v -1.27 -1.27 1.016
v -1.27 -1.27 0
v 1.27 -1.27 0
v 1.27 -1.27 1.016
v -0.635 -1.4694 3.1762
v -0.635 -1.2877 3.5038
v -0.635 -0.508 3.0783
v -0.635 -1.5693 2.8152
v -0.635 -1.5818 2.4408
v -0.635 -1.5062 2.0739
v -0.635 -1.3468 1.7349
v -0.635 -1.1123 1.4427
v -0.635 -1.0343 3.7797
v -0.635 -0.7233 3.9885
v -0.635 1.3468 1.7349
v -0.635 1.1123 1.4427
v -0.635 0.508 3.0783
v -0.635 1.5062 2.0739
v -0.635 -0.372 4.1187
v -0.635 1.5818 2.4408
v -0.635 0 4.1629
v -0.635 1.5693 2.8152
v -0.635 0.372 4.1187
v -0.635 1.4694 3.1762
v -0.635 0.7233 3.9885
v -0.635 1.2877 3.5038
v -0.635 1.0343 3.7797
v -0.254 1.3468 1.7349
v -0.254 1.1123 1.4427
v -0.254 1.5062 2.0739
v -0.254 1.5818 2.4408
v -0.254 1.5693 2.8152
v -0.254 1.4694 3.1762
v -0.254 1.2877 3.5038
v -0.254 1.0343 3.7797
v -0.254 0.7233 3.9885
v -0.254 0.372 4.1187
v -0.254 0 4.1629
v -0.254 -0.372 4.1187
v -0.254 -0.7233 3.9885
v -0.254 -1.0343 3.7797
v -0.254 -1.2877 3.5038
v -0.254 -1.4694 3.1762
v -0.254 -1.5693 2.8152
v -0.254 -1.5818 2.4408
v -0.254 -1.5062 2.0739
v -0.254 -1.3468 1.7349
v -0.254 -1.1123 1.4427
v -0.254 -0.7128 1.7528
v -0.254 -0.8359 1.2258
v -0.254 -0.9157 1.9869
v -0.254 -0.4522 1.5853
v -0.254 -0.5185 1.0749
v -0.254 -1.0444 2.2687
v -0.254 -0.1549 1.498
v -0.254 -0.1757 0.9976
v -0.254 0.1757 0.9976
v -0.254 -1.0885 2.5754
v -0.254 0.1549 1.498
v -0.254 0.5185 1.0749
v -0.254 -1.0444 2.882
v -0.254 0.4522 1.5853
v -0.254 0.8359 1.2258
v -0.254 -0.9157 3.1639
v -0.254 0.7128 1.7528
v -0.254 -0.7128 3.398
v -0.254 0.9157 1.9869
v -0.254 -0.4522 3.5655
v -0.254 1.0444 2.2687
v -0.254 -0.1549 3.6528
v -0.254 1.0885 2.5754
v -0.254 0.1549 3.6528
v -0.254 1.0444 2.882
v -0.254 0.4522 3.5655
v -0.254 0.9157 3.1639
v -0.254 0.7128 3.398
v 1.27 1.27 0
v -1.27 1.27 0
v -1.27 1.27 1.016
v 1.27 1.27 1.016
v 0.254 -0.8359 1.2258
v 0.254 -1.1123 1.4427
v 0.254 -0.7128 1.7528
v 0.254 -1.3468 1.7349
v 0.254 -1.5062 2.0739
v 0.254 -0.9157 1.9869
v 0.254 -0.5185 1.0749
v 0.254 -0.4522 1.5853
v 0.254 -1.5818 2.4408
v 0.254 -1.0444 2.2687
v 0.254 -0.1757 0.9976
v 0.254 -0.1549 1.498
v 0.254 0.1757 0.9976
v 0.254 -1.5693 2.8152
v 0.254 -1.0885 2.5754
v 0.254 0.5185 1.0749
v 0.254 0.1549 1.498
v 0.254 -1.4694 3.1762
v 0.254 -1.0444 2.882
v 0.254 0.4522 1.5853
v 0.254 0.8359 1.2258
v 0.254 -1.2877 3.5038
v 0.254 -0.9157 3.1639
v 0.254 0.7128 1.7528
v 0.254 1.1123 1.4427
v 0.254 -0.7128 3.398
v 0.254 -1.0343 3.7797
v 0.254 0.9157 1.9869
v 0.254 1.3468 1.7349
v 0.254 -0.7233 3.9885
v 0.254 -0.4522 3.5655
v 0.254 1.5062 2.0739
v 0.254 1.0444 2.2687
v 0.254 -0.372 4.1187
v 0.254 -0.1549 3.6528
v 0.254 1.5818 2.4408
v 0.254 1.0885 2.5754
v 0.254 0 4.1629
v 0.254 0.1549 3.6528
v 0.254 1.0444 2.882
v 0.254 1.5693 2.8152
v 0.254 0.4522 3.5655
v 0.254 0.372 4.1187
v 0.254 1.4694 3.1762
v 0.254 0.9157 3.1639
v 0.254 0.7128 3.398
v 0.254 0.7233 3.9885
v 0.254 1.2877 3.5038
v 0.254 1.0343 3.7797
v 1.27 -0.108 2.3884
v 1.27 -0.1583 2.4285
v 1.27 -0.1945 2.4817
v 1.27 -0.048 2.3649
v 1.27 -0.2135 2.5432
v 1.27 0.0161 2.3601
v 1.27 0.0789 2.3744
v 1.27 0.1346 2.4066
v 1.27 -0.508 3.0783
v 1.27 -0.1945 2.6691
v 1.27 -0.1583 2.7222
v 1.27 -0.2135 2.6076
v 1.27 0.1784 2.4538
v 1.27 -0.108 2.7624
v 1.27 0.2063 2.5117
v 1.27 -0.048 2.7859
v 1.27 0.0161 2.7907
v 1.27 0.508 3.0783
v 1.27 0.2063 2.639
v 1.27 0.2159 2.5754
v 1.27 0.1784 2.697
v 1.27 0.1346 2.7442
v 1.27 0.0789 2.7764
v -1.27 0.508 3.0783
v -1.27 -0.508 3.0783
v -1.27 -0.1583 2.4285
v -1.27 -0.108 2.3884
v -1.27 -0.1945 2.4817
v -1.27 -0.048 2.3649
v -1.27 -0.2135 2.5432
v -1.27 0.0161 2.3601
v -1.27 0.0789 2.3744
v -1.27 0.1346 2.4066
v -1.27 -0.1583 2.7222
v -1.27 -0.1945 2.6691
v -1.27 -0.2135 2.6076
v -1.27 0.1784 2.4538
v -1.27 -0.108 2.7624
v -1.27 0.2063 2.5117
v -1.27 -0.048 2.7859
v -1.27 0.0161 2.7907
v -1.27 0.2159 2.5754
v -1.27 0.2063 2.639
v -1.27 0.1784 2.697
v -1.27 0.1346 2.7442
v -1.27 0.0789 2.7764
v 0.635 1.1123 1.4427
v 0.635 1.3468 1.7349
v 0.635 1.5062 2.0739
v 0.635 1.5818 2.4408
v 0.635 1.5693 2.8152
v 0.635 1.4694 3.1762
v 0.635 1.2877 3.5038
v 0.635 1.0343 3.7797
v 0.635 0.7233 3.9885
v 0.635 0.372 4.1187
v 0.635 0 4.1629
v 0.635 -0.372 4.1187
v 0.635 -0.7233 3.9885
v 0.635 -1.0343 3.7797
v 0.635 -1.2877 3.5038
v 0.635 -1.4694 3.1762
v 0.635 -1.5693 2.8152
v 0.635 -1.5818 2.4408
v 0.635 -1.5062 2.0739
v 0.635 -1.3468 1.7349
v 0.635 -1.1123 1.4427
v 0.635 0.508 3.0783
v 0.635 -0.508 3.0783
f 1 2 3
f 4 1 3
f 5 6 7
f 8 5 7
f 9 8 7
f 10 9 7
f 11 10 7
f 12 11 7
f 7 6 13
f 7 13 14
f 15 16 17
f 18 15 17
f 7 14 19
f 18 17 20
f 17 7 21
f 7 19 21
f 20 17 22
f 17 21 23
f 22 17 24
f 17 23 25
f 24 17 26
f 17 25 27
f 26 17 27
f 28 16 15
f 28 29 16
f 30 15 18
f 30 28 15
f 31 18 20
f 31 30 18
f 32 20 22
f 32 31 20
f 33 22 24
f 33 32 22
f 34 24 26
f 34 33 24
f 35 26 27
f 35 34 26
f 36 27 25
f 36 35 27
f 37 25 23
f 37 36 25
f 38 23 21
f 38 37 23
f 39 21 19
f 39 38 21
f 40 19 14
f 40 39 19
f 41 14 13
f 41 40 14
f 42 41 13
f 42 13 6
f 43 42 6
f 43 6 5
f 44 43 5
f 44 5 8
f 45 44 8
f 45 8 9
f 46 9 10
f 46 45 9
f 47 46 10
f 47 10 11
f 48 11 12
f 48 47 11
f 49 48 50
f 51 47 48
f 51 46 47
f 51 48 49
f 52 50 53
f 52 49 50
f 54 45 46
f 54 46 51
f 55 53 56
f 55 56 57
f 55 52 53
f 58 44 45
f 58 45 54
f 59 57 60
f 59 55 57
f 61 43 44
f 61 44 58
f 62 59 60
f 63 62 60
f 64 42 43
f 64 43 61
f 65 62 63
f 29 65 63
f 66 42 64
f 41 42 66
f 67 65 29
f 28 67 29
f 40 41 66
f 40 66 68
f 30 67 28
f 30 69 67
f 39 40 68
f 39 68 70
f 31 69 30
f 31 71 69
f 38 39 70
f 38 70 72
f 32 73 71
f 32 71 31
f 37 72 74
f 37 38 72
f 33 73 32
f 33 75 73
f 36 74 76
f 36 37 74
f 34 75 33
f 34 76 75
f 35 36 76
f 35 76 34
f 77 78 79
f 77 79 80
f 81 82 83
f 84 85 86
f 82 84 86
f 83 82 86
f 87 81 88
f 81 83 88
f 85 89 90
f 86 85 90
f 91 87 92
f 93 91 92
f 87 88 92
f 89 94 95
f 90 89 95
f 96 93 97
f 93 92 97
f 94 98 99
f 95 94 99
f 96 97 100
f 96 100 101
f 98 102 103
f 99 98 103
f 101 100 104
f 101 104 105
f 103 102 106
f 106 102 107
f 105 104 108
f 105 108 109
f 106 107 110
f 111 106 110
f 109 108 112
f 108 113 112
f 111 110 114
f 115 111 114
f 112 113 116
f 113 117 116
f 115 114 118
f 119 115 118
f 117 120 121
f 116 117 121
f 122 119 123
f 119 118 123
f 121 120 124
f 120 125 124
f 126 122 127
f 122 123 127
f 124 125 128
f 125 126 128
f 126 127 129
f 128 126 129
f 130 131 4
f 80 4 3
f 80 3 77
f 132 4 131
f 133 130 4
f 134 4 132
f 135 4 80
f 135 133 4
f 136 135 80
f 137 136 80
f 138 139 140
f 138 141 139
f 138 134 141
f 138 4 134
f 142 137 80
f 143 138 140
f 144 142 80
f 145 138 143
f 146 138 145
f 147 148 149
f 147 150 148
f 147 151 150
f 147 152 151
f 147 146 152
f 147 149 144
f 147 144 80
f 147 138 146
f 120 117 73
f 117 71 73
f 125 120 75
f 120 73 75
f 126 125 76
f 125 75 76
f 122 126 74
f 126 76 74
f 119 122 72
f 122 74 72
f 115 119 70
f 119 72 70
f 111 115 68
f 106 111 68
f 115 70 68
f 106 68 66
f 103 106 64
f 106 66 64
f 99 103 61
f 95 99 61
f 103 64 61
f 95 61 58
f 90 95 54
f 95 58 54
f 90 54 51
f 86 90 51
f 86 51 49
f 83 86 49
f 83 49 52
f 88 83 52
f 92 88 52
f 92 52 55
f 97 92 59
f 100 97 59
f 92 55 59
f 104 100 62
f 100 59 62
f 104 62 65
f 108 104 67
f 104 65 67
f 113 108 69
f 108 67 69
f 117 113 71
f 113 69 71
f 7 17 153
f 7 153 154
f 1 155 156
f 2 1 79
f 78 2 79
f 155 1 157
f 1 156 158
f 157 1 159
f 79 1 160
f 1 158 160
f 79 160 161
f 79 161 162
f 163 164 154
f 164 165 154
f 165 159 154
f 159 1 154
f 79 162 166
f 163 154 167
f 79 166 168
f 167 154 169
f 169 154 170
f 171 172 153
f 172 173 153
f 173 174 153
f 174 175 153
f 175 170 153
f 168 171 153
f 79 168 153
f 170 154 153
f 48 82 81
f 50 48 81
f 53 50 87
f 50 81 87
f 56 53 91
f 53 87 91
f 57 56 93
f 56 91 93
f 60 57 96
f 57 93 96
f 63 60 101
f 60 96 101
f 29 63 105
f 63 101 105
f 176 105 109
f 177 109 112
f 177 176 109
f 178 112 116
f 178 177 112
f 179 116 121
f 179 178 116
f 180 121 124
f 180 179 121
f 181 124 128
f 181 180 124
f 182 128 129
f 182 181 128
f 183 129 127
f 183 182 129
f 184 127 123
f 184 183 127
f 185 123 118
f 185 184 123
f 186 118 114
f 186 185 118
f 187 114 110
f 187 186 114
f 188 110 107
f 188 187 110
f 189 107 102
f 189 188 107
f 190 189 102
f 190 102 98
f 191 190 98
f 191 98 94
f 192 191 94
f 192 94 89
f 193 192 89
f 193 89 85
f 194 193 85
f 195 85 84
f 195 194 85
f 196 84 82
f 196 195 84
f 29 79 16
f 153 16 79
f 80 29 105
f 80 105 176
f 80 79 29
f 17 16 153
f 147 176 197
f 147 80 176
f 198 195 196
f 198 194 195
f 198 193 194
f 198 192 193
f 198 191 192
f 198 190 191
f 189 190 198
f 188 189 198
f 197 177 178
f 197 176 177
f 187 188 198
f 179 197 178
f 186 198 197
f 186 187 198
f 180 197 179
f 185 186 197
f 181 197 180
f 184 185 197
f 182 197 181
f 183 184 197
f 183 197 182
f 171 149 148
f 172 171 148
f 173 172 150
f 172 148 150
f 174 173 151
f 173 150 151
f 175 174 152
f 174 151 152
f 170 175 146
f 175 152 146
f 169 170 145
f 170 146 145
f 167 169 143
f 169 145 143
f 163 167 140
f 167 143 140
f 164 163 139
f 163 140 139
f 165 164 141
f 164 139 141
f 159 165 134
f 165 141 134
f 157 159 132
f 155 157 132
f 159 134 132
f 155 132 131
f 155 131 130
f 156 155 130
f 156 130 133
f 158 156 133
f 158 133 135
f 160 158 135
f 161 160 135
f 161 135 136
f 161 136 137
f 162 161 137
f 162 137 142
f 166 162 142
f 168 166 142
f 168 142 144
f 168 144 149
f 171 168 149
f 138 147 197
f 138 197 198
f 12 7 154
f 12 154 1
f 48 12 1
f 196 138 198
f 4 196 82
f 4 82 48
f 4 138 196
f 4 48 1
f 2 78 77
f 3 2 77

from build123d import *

# Parameters (mm, degrees)
F0_W     = 2.54
F0_H     = 2.54
F1_DEPTH = 1.016
F2_R     = 1.5875
F3_DEPTH = 0.635
F5_DEPTH = 2.54
F6_R     = 1.5875
F6_R_2   = 1.0884910838
F7_DEPTH = 0.254
F8_R     = 0.2159
F9_DEPTH = 25.4


with BuildPart() as f1:
    # F0 (on Top) → F1 (new body)
    with BuildSketch(Plane.XY):
        Rectangle(F0_W, F0_H)
    extrude(amount=F1_DEPTH)

    # F2 (on Right) → F3 (join, symmetric)
    with BuildSketch(Plane.YZ):
        with Locations((0, 2.5753788533)):
            Circle(F2_R)
    extrude(amount=F3_DEPTH, both=True)

    # F4 (on face) → F5 (join)
    with BuildSketch(Plane.YZ.offset(1.27)):
        Polygon((-0.508, 3.0783452729), (-1.27, 1.016), (1.27, 1.016), (0.508, 3.0783452729), align=None)
    extrude(amount=-F5_DEPTH)

    # F6 (on Right) → F7 (cut, symmetric)
    with BuildSketch(Plane.YZ):
        with Locations((0, 2.5753788533)):
            Circle(F6_R)
        with Locations((0, 2.5753788533)):
            Circle(F6_R_2, mode=Mode.SUBTRACT)
    extrude(amount=F7_DEPTH, both=True, mode=Mode.SUBTRACT)

    # F8 (on face) → F9 (cut)
    with BuildSketch(Plane.YZ.offset(1.27)):
        with Locations((0, 2.5753788533)):
            Circle(F8_R)
    extrude(amount=-F9_DEPTH, mode=Mode.SUBTRACT)


solid = f1.part
